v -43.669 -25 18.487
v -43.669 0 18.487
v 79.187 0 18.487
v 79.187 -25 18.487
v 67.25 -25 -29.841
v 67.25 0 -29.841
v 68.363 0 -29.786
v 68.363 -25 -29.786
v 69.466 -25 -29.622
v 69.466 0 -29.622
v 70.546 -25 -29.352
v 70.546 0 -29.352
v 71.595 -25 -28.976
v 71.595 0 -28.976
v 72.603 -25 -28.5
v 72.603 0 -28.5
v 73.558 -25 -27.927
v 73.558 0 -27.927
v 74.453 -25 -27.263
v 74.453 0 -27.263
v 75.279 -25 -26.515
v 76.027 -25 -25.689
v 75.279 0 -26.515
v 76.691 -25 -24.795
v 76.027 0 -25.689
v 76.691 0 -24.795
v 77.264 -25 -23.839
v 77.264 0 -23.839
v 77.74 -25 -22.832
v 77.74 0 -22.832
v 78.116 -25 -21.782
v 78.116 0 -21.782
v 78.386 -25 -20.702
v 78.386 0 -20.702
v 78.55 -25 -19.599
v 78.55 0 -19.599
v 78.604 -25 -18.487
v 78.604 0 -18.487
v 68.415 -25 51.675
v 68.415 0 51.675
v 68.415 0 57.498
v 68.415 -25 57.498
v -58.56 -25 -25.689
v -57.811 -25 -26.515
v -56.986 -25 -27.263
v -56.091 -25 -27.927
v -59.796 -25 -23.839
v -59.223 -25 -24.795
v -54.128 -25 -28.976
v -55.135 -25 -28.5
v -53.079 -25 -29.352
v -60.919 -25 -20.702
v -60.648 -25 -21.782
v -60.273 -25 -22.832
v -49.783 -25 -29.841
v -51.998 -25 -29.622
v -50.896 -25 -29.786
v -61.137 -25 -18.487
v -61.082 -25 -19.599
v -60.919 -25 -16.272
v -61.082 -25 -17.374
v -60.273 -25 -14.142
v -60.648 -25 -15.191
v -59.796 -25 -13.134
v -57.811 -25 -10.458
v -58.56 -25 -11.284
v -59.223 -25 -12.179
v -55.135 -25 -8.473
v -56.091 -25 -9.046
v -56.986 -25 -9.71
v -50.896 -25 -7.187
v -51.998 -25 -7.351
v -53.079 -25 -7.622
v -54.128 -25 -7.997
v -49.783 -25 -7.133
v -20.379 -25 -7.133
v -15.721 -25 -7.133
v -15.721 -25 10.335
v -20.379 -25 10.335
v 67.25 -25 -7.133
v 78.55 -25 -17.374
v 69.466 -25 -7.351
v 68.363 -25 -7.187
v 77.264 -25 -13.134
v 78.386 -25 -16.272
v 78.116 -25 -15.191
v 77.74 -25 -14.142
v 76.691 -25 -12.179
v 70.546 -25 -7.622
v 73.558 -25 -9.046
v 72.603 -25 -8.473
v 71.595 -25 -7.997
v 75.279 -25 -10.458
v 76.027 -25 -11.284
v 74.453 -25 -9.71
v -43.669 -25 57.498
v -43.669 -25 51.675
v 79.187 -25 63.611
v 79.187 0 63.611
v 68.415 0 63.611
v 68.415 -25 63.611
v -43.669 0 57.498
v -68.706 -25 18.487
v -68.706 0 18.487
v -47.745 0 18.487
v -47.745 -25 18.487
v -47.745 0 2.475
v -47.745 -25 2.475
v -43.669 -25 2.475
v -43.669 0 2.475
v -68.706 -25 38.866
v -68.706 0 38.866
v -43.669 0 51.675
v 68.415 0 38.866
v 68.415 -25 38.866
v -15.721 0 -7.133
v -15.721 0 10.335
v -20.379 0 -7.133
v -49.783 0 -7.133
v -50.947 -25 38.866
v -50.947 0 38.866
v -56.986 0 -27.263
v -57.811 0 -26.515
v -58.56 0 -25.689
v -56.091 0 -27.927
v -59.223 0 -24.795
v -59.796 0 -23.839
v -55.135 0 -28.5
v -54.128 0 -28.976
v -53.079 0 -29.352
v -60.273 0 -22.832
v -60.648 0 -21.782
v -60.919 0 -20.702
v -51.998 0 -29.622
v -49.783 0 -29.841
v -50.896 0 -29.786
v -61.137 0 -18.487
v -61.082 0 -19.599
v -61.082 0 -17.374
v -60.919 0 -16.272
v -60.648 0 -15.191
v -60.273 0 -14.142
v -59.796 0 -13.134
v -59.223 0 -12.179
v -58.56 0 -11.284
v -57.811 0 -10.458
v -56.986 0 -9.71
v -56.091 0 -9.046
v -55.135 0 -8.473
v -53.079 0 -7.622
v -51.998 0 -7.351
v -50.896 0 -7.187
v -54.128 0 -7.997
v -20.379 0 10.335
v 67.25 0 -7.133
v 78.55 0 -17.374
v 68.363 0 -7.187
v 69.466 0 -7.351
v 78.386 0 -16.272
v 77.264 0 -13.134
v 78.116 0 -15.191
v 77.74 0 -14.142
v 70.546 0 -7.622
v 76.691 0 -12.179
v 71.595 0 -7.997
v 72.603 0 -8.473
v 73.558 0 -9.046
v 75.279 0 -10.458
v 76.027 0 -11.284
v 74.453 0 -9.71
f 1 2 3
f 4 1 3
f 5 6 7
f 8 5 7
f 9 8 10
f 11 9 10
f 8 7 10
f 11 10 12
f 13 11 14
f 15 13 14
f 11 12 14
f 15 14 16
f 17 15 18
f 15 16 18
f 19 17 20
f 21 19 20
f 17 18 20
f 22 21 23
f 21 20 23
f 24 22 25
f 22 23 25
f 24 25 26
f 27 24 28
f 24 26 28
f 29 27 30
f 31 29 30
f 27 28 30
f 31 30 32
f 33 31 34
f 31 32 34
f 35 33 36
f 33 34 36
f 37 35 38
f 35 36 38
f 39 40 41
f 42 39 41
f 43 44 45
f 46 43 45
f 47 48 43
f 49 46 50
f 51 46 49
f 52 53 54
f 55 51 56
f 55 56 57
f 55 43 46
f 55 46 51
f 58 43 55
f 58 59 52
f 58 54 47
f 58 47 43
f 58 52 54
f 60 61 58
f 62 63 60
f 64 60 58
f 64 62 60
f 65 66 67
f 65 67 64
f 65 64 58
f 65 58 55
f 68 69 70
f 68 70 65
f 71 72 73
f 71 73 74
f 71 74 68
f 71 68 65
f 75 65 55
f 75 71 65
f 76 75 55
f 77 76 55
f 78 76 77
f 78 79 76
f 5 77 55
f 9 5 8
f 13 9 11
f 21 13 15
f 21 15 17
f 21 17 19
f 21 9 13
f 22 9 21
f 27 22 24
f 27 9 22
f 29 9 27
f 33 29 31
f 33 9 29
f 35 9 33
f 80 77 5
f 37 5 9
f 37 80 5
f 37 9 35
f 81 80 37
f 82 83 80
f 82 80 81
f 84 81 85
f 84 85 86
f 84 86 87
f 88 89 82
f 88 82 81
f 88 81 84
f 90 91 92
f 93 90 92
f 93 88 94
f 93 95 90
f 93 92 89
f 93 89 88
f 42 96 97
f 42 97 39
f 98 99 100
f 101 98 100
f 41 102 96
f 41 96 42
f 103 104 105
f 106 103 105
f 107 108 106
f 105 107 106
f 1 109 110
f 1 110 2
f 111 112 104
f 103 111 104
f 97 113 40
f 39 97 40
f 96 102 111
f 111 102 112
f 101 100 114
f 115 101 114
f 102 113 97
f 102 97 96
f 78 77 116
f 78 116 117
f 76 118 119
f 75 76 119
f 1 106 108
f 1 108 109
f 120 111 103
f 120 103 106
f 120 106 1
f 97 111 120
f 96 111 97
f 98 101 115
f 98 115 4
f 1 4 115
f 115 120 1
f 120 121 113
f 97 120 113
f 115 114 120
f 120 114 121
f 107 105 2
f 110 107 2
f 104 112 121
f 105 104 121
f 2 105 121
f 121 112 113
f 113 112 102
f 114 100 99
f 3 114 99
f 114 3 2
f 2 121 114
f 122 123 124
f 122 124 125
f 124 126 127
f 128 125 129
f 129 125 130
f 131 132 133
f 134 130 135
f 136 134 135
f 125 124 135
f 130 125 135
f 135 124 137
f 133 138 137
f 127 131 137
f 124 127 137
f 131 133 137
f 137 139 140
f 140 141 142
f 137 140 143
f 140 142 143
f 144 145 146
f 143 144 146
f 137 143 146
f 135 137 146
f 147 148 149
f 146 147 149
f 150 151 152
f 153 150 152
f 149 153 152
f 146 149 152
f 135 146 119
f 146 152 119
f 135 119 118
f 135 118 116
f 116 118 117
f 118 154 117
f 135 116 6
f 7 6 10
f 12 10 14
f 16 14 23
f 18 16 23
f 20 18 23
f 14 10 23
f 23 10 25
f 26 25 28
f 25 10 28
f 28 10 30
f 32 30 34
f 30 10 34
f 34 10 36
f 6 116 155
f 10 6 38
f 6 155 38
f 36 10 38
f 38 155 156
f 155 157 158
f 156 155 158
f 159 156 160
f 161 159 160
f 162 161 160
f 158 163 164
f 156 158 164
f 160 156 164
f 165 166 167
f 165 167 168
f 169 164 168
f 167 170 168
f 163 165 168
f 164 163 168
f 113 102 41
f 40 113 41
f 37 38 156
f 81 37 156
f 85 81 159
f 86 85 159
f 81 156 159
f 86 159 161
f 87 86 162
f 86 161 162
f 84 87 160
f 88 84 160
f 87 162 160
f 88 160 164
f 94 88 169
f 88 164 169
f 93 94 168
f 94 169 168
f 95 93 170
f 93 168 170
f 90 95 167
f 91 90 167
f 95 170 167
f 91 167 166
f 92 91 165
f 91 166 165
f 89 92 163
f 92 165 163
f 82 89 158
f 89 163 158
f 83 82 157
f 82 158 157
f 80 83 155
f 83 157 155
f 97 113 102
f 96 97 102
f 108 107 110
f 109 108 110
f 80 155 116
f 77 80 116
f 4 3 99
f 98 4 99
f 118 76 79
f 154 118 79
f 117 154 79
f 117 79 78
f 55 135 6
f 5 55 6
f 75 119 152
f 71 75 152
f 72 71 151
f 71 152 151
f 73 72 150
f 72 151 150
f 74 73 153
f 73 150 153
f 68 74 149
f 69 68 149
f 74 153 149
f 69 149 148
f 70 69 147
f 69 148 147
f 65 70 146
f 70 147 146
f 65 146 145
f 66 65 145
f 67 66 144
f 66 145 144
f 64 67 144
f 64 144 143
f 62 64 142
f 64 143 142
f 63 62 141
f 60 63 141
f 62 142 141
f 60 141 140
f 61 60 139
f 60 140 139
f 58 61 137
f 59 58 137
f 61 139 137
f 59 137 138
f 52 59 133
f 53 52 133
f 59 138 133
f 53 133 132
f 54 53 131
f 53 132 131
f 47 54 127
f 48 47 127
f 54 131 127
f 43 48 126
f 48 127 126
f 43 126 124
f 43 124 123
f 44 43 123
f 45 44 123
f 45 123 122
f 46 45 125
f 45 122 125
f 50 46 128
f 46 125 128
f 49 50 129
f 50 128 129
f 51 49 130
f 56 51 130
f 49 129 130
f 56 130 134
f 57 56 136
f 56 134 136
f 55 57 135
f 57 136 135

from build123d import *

# Parameters (mm, degrees)
F0_W     = 112.08411
F0_H     = 5.822547
F1_DEPTH = 25
F0_W_2   = 4.075788
F0_H_2   = 16.012016
F2_DEPTH = 25
F0_W_3   = 4.65804
F0_H_3   = 17.467653
F3_DEPTH = 25


with BuildPart() as f1:
    # F0 (on Front) → F1 (new body)
    with BuildSketch(Plane.XZ):
        with Locations((12.372924, 54.586414)):
            Rectangle(F0_W, F0_H)
    extrude(amount=F1_DEPTH)


with BuildPart() as f2:
    # F0 (on Front) → F2 (new body)
    with BuildSketch(Plane.XZ):
        Polygon((-43.669131, 57.497688), (-68.706103, 38.865529), (-50.947323, 38.865529), (-43.669131, 51.675141), align=None)
        Polygon((-50.947323, 38.865529), (-68.706103, 38.865529), (-68.706103, 18.4866), (-47.744919, 18.4866), (-43.669131, 18.4866), (79.186693, 18.4866), (79.186693, 38.865529), (68.414979, 38.865529), align=None)
        Polygon((68.414979, 51.675141), (68.414979, 38.865529), (79.186693, 38.865529), (79.186693, 63.611373), (68.414979, 63.611373), (68.414979, 57.497688), align=None)
        with Locations((-45.707025, 10.480592)):
            Rectangle(F0_W_2, F0_H_2)
    extrude(amount=F2_DEPTH)


with BuildPart() as f3:
    # F0 (on Front) → F3 (new body)
    with BuildSketch(Plane.XZ):
        with BuildLine():
            Line((-20.378929, -7.132625), (-49.782813, -7.132625))
            ThreePointArc((-49.782813, -7.132625), (-41.75434, -10.458127), (-38.428838, -18.486599))
            ThreePointArc((-38.428838, -18.486599), (-41.75434, -26.515072), (-49.782813, -29.840574))
            Line((-49.782813, -29.840574), (67.250468, -29.840574))
            ThreePointArc((67.250468, -29.840574), (55.896494, -18.486599), (67.250468, -7.132625))
            Line((67.250468, -7.132625), (-15.720889, -7.132625))
            Line((-15.720889, -7.132625), (-20.378929, -7.132625))
        make_face()
        with Locations((-18.049909, 1.601201)):
            Rectangle(F0_W_3, F0_H_3)
        with BuildLine():
            ThreePointArc((-38.428838, -18.486599), (-41.75434, -10.458127), (-49.782813, -7.132625))
            Line((-49.782813, -7.132625), (-49.782813, -29.840574))
            ThreePointArc((-49.782813, -29.840574), (-41.75434, -26.515072), (-38.428838, -18.486599))
        make_face()
        with BuildLine():
            Line((-49.782813, -29.840574), (-49.782813, -7.132625))
            ThreePointArc((-49.782813, -7.132625), (-61.136787, -18.486599), (-49.782813, -29.840574))
        make_face()
        with BuildLine():
            ThreePointArc((67.250468, -7.132625), (55.896494, -18.486599), (67.250468, -29.840574))
            Line((67.250468, -29.840574), (67.250468, -7.132625))
        make_face()
        with BuildLine():
            Line((67.250468, -7.132625), (67.250468, -29.840574))
            ThreePointArc((67.250468, -29.840574), (75.27894, -26.515072), (78.604442, -18.486599))
            ThreePointArc((78.604442, -18.486599), (75.27894, -10.458127), (67.250468, -7.132625))
        make_face()
    extrude(amount=F3_DEPTH)


solid = Compound([f1.part, f2.part, f3.part])
